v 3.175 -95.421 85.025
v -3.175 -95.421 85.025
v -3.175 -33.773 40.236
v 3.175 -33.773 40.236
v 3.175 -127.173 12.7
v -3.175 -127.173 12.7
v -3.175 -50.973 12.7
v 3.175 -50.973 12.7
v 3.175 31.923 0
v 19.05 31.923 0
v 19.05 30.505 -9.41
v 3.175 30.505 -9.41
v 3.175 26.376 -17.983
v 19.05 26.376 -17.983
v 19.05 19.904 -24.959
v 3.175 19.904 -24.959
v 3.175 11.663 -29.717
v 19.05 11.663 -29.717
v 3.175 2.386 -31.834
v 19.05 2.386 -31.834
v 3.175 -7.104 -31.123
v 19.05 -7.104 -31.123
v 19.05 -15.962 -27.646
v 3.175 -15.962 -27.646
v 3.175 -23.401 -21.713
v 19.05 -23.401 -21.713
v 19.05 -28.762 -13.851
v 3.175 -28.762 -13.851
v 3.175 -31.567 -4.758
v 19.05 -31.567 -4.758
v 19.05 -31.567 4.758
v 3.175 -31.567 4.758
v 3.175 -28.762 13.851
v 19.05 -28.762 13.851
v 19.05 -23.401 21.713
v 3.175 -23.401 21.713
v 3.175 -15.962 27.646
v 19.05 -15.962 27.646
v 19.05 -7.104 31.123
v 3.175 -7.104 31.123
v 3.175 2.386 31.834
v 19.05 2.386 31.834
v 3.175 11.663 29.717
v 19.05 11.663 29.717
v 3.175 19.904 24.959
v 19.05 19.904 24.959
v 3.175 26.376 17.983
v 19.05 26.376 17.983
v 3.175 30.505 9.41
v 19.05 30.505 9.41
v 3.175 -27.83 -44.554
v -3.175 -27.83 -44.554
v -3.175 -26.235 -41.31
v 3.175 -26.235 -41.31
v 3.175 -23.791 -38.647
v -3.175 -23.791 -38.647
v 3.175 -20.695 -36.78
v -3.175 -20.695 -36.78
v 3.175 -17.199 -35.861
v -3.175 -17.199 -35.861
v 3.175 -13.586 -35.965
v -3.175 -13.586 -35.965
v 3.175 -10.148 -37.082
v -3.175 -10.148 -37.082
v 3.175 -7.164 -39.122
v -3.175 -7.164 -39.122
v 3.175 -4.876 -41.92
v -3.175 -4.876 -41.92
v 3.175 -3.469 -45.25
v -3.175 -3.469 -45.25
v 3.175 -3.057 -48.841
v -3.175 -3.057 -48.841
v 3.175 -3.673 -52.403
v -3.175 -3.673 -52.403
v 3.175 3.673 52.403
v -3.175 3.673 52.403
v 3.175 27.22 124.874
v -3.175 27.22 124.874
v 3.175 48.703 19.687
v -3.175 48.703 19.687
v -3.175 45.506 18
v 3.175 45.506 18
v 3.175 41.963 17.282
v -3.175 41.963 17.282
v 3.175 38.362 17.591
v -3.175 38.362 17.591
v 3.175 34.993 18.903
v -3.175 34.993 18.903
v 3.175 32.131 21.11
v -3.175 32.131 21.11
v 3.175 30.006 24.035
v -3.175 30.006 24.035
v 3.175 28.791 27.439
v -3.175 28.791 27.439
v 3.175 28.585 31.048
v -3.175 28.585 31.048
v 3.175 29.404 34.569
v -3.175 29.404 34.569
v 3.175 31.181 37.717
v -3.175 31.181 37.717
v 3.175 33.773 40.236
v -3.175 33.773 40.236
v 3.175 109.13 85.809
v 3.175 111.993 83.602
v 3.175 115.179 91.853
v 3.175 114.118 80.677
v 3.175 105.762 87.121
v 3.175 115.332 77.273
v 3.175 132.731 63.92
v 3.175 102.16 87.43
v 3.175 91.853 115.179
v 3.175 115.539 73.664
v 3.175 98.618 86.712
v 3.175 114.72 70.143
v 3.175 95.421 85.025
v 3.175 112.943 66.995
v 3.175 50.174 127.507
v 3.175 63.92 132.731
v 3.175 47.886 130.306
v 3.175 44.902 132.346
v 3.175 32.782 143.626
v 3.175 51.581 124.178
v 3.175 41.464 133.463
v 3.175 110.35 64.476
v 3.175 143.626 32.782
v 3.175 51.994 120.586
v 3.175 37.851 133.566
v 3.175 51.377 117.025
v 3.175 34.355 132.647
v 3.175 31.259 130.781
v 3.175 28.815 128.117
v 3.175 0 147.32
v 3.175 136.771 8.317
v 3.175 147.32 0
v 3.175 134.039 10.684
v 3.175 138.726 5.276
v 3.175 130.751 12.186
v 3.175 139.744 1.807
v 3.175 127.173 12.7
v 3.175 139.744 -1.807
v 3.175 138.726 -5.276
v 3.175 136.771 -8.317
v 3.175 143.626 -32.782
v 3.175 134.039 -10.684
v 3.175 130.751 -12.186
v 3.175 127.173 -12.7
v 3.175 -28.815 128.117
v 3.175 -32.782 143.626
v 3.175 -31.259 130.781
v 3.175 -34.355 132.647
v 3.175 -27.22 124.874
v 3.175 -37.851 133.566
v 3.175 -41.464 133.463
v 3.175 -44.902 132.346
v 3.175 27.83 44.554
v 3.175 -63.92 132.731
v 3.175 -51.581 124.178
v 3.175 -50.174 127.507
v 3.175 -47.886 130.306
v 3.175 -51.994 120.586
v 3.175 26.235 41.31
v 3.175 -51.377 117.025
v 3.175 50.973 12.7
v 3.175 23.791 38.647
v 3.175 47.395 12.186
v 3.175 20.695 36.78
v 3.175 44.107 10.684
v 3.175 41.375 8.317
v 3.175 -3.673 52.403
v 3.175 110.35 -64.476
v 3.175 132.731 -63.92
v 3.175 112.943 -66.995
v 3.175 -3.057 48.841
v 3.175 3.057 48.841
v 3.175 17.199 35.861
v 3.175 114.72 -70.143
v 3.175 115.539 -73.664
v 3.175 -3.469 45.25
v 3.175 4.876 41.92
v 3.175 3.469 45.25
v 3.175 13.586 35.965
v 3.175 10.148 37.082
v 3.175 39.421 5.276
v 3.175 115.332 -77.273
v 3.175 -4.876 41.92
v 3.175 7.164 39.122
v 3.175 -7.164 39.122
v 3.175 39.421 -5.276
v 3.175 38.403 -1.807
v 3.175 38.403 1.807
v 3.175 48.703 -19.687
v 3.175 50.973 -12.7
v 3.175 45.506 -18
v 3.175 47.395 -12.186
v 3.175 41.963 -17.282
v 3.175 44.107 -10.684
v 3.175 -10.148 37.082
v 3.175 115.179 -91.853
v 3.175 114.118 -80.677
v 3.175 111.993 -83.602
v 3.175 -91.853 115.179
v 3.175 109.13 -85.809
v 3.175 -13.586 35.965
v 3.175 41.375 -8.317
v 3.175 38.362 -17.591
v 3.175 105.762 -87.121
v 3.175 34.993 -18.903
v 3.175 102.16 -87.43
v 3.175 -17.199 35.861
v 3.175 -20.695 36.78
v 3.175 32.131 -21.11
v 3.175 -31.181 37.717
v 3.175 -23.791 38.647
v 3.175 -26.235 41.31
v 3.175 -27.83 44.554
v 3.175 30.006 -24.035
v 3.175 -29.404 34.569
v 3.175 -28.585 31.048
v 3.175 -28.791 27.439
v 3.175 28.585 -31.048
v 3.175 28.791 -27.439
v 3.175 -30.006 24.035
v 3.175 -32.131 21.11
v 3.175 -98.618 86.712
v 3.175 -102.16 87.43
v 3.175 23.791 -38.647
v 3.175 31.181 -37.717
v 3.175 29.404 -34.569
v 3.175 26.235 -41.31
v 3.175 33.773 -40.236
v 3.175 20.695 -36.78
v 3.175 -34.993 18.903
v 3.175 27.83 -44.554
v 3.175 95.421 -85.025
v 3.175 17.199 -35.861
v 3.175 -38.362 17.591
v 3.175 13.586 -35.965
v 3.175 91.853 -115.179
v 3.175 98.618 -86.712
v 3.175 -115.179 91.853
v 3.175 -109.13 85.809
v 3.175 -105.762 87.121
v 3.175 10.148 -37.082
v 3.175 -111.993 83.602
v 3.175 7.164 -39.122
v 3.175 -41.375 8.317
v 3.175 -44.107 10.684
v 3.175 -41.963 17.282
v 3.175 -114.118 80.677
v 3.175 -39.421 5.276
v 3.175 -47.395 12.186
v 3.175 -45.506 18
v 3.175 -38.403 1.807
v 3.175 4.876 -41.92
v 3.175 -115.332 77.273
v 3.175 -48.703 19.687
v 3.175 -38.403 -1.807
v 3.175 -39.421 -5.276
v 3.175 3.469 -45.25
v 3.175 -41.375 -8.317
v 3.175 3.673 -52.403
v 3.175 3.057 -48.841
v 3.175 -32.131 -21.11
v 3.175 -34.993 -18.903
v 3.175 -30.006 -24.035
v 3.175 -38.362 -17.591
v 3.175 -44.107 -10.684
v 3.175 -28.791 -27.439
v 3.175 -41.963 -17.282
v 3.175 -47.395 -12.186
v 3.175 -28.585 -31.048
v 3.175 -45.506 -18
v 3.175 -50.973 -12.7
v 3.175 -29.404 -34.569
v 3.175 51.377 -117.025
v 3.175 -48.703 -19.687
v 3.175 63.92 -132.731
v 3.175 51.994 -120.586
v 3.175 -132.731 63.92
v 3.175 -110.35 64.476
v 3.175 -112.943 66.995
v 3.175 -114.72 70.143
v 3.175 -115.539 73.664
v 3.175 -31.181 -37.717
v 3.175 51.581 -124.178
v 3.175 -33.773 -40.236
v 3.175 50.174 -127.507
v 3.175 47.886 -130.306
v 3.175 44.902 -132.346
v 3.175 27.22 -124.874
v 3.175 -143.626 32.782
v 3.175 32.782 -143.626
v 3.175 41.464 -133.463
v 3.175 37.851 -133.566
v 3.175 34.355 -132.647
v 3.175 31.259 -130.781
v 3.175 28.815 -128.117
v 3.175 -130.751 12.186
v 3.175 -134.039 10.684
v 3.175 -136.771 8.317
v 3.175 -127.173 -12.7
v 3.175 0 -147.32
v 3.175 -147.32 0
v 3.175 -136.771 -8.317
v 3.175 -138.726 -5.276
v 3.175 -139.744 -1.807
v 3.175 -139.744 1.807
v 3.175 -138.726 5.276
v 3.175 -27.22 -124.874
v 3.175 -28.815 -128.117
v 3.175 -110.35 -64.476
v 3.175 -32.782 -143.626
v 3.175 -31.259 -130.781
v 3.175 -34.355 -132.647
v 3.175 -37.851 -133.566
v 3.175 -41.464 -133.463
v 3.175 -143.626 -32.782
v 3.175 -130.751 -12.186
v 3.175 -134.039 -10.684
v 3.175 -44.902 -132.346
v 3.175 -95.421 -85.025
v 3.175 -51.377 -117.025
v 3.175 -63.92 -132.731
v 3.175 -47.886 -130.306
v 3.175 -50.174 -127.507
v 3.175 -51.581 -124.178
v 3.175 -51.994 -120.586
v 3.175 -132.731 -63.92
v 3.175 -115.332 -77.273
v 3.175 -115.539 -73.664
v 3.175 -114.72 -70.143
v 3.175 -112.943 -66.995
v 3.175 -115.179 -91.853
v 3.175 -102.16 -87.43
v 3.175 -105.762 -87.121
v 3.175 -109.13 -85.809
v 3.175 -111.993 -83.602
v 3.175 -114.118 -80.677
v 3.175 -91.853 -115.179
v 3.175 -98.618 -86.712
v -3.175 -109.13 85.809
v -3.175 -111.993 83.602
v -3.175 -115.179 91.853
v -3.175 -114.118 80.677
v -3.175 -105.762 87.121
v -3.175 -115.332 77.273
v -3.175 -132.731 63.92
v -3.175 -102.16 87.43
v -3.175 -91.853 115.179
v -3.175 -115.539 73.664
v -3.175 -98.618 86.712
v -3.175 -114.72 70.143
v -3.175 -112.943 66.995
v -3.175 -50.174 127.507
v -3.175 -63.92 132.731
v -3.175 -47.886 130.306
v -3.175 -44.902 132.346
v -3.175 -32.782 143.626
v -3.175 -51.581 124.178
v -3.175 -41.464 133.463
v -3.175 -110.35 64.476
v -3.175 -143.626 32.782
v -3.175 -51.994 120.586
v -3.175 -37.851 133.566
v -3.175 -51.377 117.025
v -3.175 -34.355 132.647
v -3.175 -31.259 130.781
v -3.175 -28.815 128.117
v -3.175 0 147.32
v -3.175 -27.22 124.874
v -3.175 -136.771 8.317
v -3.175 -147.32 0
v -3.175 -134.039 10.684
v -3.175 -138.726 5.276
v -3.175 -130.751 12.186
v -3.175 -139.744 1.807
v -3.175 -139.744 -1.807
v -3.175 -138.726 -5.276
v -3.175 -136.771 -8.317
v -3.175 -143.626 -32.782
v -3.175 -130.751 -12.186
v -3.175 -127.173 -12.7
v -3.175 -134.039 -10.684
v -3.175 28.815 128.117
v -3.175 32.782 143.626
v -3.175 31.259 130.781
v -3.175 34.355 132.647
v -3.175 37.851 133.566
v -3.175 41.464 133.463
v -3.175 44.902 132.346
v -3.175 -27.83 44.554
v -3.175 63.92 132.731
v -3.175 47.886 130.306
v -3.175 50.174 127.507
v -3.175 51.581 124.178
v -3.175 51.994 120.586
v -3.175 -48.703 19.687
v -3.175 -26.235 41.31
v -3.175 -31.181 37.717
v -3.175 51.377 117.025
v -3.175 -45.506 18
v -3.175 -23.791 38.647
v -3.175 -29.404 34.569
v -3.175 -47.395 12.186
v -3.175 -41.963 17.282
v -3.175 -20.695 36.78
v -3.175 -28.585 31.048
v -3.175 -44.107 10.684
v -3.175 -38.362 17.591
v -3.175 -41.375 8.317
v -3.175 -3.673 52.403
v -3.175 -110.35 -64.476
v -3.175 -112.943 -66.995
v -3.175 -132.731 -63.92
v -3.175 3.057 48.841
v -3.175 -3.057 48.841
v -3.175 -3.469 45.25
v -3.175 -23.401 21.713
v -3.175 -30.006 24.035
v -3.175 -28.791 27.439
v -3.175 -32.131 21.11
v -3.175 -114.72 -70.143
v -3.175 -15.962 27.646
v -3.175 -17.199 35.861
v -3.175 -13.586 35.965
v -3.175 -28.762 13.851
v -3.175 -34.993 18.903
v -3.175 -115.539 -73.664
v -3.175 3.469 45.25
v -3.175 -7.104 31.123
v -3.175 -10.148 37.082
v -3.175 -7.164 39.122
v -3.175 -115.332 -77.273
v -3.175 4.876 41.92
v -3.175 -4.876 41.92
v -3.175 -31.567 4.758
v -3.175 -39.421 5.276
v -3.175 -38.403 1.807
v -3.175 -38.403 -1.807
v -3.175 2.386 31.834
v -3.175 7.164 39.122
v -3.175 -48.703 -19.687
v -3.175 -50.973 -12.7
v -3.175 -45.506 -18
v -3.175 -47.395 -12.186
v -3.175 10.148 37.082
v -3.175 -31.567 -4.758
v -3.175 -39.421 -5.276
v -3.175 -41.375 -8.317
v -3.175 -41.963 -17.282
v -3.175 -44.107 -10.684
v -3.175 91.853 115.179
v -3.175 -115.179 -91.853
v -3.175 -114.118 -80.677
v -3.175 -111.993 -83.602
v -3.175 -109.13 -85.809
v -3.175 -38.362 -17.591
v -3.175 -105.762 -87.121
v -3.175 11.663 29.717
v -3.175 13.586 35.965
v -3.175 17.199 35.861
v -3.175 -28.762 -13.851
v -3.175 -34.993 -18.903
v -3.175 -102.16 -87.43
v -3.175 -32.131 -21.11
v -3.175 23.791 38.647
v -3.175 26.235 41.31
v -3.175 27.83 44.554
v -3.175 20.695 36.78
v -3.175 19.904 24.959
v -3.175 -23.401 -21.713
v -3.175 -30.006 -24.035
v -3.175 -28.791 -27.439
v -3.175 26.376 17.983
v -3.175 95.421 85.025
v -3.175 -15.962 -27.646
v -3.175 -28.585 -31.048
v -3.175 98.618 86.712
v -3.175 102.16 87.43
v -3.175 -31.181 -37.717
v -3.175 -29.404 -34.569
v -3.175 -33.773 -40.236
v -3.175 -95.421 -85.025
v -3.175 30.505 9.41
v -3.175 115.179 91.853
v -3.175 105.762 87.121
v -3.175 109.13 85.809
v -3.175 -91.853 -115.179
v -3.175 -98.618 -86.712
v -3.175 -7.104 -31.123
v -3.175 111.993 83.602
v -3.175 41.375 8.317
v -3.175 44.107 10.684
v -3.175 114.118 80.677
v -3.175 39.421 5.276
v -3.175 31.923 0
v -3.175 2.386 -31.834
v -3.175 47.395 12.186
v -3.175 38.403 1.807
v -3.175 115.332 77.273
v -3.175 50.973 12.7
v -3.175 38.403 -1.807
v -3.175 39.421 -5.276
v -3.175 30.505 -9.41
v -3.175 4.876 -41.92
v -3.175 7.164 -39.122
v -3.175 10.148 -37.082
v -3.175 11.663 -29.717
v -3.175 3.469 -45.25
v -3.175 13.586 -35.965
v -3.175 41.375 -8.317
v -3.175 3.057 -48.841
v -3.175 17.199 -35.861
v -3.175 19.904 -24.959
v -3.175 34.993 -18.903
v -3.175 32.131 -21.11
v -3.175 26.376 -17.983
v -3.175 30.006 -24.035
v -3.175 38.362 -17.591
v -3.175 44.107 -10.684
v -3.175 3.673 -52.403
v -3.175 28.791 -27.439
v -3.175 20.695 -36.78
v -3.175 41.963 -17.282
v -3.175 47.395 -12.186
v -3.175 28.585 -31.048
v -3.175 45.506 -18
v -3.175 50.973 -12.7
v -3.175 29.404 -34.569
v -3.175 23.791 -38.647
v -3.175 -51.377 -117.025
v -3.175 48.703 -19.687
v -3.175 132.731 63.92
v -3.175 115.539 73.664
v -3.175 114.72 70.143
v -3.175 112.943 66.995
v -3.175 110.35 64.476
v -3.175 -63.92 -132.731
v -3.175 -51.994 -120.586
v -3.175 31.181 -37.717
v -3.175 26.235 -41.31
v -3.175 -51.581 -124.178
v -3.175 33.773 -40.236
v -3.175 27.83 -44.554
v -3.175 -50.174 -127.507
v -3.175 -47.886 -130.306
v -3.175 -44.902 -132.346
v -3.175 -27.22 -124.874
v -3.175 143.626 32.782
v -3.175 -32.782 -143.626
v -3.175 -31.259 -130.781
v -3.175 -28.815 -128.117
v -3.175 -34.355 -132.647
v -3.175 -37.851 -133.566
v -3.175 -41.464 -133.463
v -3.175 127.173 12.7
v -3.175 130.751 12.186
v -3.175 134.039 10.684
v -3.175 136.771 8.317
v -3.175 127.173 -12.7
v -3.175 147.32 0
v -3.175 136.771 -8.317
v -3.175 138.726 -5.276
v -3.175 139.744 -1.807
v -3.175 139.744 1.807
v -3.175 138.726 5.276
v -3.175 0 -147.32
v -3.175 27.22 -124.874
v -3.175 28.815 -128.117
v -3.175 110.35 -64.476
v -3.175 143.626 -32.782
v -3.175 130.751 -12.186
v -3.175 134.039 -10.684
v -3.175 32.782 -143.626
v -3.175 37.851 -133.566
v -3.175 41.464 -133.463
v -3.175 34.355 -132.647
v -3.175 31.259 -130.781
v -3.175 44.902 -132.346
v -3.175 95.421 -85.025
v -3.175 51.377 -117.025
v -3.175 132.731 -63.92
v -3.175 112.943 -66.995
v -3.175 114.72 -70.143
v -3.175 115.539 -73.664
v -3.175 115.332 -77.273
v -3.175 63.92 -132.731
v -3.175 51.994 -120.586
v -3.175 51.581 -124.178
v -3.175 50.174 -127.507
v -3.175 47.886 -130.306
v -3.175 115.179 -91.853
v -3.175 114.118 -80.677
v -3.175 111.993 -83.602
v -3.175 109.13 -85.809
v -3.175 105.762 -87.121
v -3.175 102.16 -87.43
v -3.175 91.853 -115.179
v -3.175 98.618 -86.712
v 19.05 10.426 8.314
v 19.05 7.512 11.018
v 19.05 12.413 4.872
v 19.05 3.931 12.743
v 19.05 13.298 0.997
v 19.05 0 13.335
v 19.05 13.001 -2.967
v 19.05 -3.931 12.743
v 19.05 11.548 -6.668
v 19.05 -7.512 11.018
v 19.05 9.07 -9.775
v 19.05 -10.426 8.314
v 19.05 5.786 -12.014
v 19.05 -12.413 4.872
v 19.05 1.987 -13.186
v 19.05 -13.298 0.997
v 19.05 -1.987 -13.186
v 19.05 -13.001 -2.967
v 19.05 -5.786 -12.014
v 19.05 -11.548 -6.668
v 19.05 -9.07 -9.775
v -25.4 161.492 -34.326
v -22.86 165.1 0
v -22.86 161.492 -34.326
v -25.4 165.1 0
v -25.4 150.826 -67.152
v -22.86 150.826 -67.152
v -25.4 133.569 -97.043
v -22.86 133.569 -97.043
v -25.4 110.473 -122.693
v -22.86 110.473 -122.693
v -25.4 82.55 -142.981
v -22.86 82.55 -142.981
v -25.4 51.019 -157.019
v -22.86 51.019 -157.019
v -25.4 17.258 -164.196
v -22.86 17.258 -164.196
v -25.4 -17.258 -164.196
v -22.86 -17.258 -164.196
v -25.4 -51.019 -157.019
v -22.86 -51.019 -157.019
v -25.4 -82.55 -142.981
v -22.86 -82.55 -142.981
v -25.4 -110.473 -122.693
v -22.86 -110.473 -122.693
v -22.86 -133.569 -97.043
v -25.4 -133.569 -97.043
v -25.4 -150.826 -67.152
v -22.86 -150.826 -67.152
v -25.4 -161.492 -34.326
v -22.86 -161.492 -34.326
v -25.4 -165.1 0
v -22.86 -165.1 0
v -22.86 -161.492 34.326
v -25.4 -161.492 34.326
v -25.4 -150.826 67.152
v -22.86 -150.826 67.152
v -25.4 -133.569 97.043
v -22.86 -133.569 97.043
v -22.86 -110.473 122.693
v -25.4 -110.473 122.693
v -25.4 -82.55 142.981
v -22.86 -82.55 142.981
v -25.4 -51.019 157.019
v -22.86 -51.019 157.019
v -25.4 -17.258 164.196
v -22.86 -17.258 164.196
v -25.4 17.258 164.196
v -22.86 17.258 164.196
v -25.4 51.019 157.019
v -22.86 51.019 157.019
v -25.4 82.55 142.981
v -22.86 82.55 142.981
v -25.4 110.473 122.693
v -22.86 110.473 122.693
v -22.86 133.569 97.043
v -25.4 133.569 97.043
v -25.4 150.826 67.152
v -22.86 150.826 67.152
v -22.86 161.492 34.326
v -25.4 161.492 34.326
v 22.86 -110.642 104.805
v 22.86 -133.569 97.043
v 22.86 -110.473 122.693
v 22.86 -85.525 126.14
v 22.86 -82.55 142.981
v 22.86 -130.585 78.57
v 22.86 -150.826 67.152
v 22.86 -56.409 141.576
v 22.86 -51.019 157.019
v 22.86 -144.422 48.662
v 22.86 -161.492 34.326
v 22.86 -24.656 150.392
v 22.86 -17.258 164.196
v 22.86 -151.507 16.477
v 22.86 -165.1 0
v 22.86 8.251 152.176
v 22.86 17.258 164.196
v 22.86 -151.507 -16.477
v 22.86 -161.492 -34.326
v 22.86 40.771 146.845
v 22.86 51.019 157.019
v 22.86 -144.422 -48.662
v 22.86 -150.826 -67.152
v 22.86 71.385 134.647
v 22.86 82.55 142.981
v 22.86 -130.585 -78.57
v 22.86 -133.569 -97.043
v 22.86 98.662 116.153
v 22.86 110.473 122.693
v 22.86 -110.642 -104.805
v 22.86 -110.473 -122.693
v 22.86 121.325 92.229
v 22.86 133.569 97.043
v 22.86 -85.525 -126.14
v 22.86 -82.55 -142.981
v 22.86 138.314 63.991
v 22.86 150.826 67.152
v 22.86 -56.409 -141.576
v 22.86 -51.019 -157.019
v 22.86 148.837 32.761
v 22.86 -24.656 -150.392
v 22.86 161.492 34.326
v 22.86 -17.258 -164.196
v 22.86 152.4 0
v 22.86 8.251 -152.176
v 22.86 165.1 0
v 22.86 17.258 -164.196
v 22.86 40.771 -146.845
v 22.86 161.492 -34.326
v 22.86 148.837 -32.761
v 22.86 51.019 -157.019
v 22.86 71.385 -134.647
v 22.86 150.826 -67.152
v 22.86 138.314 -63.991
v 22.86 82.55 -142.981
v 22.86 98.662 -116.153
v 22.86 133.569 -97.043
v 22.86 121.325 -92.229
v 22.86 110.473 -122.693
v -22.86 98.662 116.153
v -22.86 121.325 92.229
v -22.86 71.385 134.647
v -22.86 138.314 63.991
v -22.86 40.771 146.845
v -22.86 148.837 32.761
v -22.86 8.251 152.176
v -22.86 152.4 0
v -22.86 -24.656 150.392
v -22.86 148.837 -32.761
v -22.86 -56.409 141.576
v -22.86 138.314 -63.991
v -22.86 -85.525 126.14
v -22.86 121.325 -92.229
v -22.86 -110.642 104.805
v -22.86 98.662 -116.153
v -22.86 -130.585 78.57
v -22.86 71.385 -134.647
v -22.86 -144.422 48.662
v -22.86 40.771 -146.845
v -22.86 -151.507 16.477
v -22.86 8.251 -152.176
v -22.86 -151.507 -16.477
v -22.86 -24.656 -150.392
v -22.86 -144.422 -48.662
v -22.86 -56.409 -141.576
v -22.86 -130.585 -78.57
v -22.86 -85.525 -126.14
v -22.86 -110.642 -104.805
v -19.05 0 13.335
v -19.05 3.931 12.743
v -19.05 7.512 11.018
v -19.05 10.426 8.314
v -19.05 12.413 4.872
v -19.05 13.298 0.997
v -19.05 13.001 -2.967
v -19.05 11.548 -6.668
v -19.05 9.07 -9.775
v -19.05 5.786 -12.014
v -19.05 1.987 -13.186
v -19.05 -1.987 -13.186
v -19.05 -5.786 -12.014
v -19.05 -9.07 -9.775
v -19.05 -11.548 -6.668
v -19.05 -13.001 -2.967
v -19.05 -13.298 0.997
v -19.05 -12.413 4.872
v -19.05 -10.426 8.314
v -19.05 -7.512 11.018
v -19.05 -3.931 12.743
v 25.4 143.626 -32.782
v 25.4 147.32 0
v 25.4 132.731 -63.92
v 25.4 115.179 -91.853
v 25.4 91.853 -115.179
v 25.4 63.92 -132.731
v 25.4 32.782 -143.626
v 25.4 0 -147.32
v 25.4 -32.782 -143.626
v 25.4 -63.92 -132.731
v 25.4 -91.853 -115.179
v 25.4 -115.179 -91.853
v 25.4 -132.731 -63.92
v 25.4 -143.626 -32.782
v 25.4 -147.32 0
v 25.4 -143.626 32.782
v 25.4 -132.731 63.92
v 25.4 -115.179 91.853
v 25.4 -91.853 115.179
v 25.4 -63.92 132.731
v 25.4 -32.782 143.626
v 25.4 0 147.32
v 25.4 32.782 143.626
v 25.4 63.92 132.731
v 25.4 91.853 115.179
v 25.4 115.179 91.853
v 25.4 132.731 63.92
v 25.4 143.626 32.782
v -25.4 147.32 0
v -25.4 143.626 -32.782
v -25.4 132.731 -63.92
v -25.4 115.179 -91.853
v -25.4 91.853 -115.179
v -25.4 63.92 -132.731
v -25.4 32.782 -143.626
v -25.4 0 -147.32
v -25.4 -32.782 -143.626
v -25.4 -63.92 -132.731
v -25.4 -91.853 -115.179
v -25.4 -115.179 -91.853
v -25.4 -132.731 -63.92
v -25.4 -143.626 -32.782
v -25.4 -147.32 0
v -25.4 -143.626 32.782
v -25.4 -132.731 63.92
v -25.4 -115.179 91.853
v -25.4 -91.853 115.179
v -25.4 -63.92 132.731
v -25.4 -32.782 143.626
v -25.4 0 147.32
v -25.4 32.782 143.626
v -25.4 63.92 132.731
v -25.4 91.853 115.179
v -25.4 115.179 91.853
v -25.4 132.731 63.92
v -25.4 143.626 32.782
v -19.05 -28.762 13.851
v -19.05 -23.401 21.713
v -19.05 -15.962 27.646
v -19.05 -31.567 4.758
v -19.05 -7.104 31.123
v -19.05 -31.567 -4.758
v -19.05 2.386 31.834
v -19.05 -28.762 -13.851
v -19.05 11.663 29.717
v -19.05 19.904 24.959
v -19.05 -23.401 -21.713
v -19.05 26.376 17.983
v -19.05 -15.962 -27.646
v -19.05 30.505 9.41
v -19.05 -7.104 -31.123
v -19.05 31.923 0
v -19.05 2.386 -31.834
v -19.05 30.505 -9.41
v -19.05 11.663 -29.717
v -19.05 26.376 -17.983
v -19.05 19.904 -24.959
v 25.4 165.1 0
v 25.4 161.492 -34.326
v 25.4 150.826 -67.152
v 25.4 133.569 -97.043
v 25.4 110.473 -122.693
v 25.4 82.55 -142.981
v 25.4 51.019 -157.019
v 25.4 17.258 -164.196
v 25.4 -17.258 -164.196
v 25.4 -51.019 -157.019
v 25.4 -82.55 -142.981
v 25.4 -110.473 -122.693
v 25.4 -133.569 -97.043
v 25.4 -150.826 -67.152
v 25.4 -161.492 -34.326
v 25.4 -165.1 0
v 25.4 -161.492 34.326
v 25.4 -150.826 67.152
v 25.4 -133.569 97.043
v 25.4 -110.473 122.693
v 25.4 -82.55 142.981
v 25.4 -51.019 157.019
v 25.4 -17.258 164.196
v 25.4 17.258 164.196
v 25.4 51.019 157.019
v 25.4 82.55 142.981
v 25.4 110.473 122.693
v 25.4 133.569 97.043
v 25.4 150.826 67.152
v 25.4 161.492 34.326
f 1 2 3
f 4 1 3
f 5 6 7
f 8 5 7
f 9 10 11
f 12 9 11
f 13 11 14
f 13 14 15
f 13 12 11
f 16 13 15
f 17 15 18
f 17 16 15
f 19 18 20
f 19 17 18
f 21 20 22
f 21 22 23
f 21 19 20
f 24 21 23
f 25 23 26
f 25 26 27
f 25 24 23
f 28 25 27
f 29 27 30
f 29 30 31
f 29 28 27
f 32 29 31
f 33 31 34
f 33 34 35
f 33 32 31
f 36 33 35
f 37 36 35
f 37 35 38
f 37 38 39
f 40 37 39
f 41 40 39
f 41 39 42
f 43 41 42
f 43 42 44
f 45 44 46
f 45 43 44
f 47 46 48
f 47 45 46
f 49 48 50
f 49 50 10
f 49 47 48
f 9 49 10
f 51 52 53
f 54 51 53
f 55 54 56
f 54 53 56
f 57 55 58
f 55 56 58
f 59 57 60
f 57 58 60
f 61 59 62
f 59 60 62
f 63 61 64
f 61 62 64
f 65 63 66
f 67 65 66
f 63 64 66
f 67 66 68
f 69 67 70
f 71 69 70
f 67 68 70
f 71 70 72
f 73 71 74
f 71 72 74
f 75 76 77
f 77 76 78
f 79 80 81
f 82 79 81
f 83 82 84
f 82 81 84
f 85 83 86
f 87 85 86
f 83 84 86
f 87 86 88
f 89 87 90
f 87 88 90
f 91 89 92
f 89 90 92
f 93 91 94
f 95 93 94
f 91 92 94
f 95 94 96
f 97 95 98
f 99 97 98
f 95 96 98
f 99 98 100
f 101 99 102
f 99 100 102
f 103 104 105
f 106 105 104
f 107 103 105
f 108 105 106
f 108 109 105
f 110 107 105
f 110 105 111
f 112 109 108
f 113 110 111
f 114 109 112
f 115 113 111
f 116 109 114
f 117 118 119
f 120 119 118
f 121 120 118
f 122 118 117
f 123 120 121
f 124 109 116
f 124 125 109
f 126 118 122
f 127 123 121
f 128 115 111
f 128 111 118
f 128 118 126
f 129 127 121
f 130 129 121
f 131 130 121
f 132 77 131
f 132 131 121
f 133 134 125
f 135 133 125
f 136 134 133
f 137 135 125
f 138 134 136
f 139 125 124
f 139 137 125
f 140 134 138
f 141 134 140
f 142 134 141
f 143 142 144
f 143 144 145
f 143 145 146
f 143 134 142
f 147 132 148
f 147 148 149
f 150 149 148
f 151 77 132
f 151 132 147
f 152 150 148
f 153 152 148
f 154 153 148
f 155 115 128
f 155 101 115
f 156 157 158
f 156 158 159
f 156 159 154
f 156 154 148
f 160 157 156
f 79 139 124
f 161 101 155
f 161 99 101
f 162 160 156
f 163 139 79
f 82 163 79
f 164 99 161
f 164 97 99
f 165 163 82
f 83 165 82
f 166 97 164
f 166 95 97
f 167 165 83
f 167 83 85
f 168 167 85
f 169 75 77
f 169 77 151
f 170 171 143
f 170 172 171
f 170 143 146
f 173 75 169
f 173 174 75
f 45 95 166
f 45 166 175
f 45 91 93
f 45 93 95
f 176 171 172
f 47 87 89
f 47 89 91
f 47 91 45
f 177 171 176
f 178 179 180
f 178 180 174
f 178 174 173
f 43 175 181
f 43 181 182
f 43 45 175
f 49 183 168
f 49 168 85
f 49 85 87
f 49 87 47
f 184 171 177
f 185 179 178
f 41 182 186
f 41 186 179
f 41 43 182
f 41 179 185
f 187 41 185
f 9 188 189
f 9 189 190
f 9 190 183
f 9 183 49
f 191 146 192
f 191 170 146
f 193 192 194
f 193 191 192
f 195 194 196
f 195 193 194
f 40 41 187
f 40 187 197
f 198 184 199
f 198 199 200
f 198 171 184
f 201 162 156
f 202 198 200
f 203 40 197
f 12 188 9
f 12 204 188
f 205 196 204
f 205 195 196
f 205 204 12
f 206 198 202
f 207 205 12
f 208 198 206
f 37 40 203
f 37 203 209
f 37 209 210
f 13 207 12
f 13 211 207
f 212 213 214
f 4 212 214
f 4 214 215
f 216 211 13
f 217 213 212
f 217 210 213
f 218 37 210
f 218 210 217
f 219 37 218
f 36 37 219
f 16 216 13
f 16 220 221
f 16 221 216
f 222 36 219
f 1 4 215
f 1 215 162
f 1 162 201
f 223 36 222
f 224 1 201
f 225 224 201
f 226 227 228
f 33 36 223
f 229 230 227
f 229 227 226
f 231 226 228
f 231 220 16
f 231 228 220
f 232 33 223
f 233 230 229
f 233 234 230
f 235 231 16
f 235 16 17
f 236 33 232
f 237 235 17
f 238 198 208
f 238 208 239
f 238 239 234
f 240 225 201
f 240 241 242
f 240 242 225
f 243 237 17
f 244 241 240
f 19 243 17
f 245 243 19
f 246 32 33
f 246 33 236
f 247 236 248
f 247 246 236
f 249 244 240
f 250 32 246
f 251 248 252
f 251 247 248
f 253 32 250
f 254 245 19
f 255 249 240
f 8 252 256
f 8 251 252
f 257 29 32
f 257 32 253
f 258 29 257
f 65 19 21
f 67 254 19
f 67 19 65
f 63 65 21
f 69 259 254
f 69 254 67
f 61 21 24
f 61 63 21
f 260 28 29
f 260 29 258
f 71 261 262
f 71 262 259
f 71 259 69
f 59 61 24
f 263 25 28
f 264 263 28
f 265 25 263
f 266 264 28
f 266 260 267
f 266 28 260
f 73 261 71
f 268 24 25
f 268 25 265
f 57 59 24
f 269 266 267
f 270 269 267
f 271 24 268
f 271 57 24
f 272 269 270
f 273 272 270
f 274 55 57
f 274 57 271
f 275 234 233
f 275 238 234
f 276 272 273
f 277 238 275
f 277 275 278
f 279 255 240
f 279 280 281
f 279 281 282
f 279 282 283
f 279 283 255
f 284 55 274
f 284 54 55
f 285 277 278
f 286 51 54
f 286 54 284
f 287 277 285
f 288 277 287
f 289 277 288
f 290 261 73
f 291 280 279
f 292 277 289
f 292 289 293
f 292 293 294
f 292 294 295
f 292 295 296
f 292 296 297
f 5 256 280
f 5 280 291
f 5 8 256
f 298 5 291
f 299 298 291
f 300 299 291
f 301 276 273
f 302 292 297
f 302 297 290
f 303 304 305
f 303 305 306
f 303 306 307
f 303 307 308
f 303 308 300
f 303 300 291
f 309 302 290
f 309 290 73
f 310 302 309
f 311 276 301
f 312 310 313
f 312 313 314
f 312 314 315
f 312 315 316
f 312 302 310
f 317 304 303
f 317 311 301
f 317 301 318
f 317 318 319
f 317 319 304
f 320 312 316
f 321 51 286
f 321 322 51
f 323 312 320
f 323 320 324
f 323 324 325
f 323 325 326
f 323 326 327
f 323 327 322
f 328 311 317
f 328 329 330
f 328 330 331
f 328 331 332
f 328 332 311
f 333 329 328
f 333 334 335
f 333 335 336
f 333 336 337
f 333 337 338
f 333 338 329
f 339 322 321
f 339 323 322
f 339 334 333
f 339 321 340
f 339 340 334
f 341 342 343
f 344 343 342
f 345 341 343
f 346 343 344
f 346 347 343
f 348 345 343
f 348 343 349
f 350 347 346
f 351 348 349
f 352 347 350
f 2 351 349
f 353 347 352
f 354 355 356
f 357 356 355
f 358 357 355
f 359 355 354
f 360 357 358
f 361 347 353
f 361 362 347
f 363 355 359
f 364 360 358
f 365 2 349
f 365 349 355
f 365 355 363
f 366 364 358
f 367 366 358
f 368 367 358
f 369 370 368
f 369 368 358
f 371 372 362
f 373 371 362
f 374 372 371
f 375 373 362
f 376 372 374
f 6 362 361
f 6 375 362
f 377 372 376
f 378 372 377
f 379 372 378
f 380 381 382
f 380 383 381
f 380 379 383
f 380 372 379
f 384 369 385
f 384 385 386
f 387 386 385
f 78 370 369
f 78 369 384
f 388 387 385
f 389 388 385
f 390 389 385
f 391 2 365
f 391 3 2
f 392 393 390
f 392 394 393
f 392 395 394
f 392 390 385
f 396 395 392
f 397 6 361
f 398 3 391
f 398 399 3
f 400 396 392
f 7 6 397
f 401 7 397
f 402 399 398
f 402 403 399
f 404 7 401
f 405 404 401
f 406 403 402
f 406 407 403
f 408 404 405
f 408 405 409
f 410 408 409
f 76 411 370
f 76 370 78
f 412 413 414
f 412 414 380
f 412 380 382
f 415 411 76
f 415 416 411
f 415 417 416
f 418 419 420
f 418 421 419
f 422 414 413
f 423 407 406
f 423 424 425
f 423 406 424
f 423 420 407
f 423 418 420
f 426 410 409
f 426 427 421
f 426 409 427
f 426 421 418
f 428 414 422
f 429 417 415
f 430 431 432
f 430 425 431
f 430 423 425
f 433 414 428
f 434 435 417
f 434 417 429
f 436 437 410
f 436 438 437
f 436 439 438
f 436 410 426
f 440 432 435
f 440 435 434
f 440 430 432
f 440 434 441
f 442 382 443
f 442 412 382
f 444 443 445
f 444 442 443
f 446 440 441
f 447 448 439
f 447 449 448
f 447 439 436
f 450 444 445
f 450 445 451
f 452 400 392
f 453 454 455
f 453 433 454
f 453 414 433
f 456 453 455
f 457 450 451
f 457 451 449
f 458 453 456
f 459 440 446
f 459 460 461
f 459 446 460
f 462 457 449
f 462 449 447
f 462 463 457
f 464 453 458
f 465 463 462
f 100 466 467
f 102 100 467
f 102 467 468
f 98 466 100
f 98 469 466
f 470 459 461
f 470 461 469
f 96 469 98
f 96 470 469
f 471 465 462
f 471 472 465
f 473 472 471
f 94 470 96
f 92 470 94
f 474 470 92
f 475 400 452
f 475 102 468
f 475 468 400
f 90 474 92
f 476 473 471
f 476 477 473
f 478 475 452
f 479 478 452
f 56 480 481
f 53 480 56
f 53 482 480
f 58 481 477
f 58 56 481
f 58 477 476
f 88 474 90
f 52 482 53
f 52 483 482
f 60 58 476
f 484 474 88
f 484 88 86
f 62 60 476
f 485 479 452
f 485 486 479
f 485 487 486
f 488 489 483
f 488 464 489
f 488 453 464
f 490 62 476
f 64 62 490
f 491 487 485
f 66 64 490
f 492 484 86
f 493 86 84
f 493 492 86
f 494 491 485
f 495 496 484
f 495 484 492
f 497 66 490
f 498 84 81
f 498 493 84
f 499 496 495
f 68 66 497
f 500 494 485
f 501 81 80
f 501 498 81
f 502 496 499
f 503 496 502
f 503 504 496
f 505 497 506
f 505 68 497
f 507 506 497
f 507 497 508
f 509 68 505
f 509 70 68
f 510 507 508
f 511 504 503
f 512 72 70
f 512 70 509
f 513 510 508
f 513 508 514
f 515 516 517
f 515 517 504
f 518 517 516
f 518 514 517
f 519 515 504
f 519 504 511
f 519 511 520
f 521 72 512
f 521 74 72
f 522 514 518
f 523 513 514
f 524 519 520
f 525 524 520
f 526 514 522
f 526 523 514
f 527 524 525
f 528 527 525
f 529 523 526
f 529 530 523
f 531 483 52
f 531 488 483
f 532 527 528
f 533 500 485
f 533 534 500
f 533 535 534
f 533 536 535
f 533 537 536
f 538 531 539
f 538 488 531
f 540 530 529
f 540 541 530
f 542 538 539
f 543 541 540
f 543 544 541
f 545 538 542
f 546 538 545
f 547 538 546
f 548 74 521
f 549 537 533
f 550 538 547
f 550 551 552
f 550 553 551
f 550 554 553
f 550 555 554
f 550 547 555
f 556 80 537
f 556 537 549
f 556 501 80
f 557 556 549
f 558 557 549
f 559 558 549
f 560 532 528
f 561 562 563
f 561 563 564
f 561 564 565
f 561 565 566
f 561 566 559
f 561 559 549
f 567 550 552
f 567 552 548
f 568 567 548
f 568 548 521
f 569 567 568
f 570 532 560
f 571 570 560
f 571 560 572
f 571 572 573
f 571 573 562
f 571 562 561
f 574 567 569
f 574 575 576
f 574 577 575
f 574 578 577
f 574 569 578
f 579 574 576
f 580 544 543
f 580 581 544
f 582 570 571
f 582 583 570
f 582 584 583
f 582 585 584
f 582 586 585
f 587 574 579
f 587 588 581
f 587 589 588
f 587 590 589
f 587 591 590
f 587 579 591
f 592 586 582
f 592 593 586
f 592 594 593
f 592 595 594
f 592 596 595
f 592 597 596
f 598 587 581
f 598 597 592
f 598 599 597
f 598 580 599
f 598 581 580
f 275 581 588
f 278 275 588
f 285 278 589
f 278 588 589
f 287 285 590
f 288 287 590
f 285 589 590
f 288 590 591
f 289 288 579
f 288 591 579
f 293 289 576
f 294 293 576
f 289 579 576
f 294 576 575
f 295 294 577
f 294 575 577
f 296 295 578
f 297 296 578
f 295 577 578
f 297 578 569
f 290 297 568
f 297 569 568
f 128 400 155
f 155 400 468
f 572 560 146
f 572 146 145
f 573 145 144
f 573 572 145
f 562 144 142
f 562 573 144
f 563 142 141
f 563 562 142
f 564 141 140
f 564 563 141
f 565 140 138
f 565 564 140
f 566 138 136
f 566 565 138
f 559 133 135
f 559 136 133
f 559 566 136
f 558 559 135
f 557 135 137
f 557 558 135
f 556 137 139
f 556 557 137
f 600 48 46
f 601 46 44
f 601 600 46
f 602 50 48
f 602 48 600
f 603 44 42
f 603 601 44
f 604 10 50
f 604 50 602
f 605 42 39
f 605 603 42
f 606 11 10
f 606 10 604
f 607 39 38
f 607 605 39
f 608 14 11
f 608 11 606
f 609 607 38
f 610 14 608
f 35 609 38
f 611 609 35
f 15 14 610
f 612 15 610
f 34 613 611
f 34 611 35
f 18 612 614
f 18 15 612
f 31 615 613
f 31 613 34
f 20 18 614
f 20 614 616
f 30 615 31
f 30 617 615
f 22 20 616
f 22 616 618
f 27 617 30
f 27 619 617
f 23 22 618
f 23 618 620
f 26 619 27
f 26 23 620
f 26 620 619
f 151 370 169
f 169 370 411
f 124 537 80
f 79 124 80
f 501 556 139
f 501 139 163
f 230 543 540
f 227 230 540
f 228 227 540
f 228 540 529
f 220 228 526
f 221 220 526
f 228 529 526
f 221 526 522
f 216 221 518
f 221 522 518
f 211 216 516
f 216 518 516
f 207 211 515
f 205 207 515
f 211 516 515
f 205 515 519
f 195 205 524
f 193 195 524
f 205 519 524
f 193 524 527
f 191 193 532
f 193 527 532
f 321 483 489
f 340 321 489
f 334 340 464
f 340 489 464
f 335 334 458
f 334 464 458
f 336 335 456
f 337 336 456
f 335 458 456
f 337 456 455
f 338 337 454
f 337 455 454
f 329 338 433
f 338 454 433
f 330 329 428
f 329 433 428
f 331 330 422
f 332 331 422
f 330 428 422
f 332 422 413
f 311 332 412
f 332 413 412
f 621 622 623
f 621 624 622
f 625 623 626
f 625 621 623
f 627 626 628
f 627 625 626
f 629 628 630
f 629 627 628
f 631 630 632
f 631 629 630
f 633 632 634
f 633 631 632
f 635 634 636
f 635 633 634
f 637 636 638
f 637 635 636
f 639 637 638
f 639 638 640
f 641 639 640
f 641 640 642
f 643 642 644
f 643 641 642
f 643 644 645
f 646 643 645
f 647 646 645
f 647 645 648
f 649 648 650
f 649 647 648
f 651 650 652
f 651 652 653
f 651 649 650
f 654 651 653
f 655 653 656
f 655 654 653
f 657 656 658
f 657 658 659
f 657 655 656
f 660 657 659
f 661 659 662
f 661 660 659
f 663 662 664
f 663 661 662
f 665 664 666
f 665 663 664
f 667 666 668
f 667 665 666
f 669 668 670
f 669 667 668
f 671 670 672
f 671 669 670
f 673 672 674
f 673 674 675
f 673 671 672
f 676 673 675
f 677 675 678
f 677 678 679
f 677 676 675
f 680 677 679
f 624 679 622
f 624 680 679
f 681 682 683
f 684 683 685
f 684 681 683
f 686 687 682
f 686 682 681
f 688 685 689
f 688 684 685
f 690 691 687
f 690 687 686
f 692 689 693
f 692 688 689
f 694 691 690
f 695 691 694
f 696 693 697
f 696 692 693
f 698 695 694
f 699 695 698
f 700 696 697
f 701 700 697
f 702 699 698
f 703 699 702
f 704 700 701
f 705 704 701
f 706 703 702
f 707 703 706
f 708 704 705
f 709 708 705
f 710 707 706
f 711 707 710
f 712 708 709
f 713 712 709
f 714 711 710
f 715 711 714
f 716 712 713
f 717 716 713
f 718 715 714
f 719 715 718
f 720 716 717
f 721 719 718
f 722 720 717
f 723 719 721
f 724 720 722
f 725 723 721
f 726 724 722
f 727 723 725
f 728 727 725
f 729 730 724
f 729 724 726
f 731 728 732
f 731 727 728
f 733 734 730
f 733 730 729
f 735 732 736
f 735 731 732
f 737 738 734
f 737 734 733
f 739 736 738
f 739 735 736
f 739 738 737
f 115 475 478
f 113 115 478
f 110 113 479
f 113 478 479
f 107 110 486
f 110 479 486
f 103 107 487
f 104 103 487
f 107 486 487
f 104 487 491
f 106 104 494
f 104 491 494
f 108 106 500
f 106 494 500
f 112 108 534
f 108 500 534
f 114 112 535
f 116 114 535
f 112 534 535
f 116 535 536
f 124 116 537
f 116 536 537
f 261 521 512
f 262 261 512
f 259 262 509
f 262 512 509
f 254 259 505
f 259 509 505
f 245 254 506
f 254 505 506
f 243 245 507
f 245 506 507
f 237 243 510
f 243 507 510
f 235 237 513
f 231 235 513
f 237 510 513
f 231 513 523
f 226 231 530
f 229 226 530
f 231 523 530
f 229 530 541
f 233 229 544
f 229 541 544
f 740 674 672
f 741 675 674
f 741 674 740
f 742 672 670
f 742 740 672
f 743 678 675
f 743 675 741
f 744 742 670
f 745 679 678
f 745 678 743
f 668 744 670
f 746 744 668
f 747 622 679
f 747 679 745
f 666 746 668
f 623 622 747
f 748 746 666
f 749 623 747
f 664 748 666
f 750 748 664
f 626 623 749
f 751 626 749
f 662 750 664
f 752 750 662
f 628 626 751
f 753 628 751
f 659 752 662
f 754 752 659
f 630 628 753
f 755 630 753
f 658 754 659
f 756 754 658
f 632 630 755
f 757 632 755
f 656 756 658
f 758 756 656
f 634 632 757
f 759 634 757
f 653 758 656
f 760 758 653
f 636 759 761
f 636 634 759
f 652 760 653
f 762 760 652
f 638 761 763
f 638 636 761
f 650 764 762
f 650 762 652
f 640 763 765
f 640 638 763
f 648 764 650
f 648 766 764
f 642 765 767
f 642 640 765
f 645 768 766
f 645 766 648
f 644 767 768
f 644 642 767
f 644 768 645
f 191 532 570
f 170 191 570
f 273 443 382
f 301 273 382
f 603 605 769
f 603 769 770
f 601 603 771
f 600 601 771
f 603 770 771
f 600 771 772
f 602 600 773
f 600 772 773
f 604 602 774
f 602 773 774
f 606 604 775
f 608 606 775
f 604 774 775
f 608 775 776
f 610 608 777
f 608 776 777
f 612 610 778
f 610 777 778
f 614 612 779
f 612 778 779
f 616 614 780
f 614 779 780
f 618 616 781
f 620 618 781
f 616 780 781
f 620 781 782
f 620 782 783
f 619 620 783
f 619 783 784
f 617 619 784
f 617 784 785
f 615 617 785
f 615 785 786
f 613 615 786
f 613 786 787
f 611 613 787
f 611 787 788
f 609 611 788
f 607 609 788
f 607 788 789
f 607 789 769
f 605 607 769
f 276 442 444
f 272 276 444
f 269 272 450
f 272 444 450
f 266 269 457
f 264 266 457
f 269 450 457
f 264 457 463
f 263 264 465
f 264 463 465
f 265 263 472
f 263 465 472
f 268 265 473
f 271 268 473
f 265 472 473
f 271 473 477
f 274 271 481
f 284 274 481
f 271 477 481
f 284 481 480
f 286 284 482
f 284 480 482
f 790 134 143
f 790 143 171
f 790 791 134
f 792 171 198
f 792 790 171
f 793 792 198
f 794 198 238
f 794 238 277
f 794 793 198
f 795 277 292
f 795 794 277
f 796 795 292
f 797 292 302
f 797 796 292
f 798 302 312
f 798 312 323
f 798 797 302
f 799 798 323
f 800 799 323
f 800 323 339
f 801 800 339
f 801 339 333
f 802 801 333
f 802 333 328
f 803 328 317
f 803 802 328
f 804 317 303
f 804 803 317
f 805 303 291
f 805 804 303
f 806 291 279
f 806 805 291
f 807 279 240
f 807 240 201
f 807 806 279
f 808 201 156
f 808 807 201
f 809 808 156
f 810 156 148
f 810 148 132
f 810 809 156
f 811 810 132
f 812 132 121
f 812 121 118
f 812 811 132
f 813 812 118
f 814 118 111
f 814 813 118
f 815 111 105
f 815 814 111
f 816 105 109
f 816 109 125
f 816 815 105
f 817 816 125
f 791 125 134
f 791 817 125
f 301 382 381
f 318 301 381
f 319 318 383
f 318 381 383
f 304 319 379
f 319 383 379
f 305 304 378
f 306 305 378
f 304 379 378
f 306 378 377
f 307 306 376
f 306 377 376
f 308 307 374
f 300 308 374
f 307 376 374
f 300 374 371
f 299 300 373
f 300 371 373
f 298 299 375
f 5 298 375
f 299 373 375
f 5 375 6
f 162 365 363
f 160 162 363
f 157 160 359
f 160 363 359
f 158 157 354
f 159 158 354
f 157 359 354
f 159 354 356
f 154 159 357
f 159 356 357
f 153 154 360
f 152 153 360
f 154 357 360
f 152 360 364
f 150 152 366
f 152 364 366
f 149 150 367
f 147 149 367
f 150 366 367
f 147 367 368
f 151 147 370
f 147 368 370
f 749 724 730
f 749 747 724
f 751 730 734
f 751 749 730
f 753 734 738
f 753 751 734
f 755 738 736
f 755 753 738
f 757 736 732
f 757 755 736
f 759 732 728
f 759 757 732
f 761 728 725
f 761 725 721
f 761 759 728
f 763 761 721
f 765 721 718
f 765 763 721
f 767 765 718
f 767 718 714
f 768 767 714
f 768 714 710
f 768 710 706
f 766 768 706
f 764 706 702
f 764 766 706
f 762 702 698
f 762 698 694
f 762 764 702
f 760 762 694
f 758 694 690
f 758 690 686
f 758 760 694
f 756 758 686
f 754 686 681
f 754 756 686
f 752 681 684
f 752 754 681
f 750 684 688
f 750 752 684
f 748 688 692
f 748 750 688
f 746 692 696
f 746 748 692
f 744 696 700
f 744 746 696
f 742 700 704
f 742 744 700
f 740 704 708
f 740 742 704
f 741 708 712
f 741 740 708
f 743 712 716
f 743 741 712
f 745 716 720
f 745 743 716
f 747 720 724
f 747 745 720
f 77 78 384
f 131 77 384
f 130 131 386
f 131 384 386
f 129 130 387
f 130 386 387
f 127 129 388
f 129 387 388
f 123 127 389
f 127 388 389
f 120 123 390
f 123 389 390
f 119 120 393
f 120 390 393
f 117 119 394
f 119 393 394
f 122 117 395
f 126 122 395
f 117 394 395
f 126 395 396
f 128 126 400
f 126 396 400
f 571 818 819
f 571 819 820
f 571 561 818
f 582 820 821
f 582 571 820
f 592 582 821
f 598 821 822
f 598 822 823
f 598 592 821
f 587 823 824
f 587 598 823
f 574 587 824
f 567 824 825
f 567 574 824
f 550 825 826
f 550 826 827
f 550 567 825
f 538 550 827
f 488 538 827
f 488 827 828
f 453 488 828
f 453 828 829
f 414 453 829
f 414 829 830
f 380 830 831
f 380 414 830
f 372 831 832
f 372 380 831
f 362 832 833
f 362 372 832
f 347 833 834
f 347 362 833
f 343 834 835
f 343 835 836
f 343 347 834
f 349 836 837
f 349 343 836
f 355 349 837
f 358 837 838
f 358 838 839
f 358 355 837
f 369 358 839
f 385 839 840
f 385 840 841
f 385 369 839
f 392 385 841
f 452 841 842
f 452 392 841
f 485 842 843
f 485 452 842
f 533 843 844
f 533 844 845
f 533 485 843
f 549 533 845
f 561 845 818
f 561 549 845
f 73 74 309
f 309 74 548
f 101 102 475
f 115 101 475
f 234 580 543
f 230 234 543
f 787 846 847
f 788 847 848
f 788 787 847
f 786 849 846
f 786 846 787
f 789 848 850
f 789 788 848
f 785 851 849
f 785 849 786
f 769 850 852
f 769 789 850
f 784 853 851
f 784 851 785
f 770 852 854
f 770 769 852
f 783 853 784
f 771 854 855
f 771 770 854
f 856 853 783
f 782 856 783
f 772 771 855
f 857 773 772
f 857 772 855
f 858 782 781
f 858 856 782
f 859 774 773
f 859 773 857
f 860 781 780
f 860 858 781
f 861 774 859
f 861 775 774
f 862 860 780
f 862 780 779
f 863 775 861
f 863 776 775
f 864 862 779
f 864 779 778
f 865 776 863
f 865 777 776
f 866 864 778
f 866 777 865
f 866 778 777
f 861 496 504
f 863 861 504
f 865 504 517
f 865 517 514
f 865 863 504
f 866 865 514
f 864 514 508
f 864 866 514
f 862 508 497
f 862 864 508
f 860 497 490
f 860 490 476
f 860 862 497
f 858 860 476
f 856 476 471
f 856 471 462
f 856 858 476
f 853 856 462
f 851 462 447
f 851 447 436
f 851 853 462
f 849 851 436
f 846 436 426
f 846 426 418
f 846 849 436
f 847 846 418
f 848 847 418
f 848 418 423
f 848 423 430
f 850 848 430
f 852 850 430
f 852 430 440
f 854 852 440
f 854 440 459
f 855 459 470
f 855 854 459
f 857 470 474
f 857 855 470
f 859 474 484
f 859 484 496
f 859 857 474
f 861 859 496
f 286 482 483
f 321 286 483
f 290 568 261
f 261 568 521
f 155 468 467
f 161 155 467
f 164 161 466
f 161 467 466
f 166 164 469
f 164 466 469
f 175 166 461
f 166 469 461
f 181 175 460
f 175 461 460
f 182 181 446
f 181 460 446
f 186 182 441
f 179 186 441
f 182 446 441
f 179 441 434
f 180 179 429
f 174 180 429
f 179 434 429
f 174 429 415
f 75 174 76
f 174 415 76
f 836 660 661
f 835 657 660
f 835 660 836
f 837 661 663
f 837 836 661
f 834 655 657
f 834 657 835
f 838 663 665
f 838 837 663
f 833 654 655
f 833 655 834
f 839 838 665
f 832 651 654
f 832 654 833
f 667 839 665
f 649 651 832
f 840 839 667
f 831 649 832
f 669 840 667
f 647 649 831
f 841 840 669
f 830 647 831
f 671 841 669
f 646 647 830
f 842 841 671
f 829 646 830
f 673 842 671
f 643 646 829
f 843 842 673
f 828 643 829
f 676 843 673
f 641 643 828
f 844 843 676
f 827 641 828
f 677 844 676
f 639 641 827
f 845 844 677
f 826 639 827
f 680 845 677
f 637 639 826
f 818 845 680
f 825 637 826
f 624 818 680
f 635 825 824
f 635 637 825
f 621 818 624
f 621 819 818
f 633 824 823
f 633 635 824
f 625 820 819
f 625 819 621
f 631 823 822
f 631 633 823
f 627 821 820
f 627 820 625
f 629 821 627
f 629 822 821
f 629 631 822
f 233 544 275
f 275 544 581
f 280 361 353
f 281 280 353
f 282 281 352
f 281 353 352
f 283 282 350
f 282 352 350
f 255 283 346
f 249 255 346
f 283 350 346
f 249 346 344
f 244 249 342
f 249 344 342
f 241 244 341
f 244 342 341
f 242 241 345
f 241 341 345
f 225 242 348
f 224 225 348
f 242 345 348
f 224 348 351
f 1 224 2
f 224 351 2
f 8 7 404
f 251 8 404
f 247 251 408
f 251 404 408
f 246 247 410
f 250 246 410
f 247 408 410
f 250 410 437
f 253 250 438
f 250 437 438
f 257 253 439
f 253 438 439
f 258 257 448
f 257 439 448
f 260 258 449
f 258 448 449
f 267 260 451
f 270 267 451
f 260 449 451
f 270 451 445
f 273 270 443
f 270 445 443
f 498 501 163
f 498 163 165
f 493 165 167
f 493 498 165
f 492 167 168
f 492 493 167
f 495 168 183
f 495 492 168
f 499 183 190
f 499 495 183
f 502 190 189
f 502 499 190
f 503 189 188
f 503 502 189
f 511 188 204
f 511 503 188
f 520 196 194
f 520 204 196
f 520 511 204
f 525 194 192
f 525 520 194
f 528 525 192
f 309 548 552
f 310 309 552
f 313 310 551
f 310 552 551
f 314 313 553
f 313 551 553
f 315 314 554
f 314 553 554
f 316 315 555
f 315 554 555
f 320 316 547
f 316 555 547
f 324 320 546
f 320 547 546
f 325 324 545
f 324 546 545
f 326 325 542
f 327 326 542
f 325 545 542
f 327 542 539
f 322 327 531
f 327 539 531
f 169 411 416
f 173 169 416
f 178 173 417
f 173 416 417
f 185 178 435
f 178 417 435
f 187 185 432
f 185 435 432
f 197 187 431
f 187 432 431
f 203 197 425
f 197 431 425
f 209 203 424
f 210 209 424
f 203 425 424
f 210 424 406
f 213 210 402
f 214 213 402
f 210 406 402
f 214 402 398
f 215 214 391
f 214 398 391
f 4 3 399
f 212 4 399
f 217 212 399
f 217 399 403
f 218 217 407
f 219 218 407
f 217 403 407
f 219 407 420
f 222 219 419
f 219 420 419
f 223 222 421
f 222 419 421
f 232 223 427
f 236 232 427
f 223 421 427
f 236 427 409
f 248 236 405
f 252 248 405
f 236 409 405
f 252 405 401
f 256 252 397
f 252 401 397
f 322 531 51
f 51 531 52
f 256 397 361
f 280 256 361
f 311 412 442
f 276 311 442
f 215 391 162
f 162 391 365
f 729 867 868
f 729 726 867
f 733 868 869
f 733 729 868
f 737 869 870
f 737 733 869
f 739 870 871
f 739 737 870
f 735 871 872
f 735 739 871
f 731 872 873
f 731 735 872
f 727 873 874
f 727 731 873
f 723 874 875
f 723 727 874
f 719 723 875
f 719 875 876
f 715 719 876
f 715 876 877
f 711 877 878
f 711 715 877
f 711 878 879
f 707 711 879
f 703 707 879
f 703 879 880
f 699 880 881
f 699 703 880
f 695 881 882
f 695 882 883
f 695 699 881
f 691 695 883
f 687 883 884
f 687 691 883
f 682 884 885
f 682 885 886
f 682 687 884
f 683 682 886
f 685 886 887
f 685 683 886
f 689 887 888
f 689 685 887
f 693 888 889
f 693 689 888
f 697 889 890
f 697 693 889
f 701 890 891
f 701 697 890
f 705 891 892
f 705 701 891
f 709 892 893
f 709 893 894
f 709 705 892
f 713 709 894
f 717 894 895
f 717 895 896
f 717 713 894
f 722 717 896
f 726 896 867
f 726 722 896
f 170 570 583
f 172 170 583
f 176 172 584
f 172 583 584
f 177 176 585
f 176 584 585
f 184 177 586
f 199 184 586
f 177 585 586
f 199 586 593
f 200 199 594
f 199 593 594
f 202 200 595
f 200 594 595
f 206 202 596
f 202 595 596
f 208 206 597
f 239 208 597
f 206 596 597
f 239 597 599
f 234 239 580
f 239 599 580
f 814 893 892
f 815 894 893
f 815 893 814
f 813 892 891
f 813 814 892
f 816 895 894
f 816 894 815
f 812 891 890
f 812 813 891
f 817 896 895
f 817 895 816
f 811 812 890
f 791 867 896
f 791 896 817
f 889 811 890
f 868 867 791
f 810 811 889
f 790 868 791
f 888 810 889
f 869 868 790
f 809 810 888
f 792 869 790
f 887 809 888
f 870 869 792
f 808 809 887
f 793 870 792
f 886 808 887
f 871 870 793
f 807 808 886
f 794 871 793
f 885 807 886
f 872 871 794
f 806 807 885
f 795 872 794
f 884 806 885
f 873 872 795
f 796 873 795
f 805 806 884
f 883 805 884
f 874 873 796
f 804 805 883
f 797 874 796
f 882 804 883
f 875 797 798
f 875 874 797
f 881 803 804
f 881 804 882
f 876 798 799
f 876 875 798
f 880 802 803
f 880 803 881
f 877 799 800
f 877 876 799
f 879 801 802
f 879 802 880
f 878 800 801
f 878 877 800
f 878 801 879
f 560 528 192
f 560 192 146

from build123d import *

# Parameters (mm, degrees)
SKETCH3_R                = 13.335
CUT_EXTRUDE1_DEPTH       = 7.35
CUT_EXTRUDE1_DEPTH_BACK  = 45.45
CUT_EXTRUDE10_DEPTH      = 23.225
CUT_EXTRUDE10_DEPTH_BACK = 29.575


with BuildPart() as part:
    # Sketch2 → Revolve2 (revolve)
    with BuildSketch(Plane.XY):
        Polygon((22.86, 152.4), (-22.86, 152.4), (-22.86, 165.1), (-25.4, 165.1), (-25.4, 147.32), (-3.175, 147.32), (-3.175, 31.92334197), (-19.05, 31.92334197), (-19.05, 0), (19.05, 0), (19.05, 31.92334197), (3.175, 31.92334197), (3.175, 147.32), (25.4, 147.32), (25.4, 165.1), (22.86, 165.1), align=None)
    revolve(axis=Axis((217.873654092, 0, 0), (-1, 0, 0)))

    # Sketch3 → Cut-Extrude1 (cut, two sides)
    with BuildSketch(Plane.ZY.offset(19.05)) as cut_extrude1_sk:
        Circle(SKETCH3_R)
    extrude(amount=CUT_EXTRUDE1_DEPTH, mode=Mode.SUBTRACT)
    extrude(cut_extrude1_sk.sketch, amount=-CUT_EXTRUDE1_DEPTH_BACK, mode=Mode.SUBTRACT)

    # Sketch4 → Cut-Extrude10 (cut, two sides)
    with BuildSketch(Plane.ZY.offset(3.175)) as cut_extrude10_sk:
        with BuildLine():
            Line((12.7, 127.17334197), (12.7, 50.97334197))
            ThreePointArc((12.7, 50.97334197), (0, 38.27334197), (-12.7, 50.97334197))
            Line((-12.7, 50.97334197), (-12.7, 127.17334197))
            ThreePointArc((-12.7, 127.17334197), (0, 139.87334197), (12.7, 127.17334197))
        make_face()
        with BuildLine():
            Line((64.476099066, 110.350267589), (19.686862842, 48.703172618))
            ThreePointArc((19.686862842, 48.703172618), (22.496505966, 30.963784085), (40.235894499, 33.77342721))
            Line((40.235894499, 33.77342721), (85.025130723, 95.420522181))
            ThreePointArc((85.025130723, 95.420522181), (82.215487599, 113.159910714), (64.476099066, 110.350267589))
        make_face()
        with BuildLine():
            Line((117.024519751, 51.377141657), (44.55401321, 27.830046686))
            ThreePointArc((44.55401321, 27.830046686), (36.400111281, 11.8271131), (52.403044867, 3.673211172))
            Line((52.403044867, 3.673211172), (124.873551408, 27.220306143))
            ThreePointArc((124.873551408, 27.220306143), (133.027453337, 43.223239729), (117.024519751, 51.377141657))
        make_face()
        with BuildLine():
            Line((124.873551408, -27.220306143), (52.403044867, -3.673211172))
            ThreePointArc((52.403044867, -3.673211172), (36.400111281, -11.8271131), (44.55401321, -27.830046686))
            Line((44.55401321, -27.830046686), (117.024519751, -51.377141657))
            ThreePointArc((117.024519751, -51.377141657), (133.027453337, -43.223239729), (124.873551408, -27.220306143))
        make_face()
        with BuildLine():
            Line((85.025130723, -95.420522181), (40.235894499, -33.77342721))
            ThreePointArc((40.235894499, -33.77342721), (22.496505966, -30.963784085), (19.686862842, -48.703172618))
            Line((19.686862842, -48.703172618), (64.476099066, -110.350267589))
            ThreePointArc((64.476099066, -110.350267589), (82.215487599, -113.159910714), (85.025130723, -95.420522181))
        make_face()
        with BuildLine():
            Line((12.7, -127.17334197), (12.7, -50.97334197))
            ThreePointArc((12.7, -50.97334197), (0, -38.27334197), (-12.7, -50.97334197))
            Line((-12.7, -50.97334197), (-12.7, -127.17334197))
            ThreePointArc((-12.7, -127.17334197), (0, -139.87334197), (12.7, -127.17334197))
        make_face()
        with BuildLine():
            Line((-64.476099066, -110.350267589), (-19.686862842, -48.703172618))
            ThreePointArc((-19.686862842, -48.703172618), (-22.496505966, -30.963784085), (-40.235894499, -33.77342721))
            Line((-40.235894499, -33.77342721), (-85.025130723, -95.420522181))
            ThreePointArc((-85.025130723, -95.420522181), (-82.215487599, -113.159910714), (-64.476099066, -110.350267589))
        make_face()
        with BuildLine():
            Line((-117.024519751, -51.377141657), (-44.55401321, -27.830046686))
            ThreePointArc((-44.55401321, -27.830046686), (-36.400111281, -11.8271131), (-52.403044867, -3.673211172))
            Line((-52.403044867, -3.673211172), (-124.873551408, -27.220306143))
            ThreePointArc((-124.873551408, -27.220306143), (-133.027453337, -43.223239729), (-117.024519751, -51.377141657))
        make_face()
        with BuildLine():
            Line((-124.873551408, 27.220306143), (-52.403044867, 3.673211172))
            ThreePointArc((-52.403044867, 3.673211172), (-36.400111281, 11.8271131), (-44.55401321, 27.830046686))
            Line((-44.55401321, 27.830046686), (-117.024519751, 51.377141657))
            ThreePointArc((-117.024519751, 51.377141657), (-133.027453337, 43.223239729), (-124.873551408, 27.220306143))
        make_face()
        with BuildLine():
            Line((-85.025130723, 95.420522181), (-40.235894499, 33.77342721))
            ThreePointArc((-40.235894499, 33.77342721), (-22.496505966, 30.963784085), (-19.686862842, 48.703172618))
            Line((-19.686862842, 48.703172618), (-64.476099066, 110.350267589))
            ThreePointArc((-64.476099066, 110.350267589), (-82.215487599, 113.159910714), (-85.025130723, 95.420522181))
        make_face()
    extrude(amount=CUT_EXTRUDE10_DEPTH, mode=Mode.SUBTRACT)
    extrude(cut_extrude10_sk.sketch, amount=-CUT_EXTRUDE10_DEPTH_BACK, mode=Mode.SUBTRACT)


solid = part.part
